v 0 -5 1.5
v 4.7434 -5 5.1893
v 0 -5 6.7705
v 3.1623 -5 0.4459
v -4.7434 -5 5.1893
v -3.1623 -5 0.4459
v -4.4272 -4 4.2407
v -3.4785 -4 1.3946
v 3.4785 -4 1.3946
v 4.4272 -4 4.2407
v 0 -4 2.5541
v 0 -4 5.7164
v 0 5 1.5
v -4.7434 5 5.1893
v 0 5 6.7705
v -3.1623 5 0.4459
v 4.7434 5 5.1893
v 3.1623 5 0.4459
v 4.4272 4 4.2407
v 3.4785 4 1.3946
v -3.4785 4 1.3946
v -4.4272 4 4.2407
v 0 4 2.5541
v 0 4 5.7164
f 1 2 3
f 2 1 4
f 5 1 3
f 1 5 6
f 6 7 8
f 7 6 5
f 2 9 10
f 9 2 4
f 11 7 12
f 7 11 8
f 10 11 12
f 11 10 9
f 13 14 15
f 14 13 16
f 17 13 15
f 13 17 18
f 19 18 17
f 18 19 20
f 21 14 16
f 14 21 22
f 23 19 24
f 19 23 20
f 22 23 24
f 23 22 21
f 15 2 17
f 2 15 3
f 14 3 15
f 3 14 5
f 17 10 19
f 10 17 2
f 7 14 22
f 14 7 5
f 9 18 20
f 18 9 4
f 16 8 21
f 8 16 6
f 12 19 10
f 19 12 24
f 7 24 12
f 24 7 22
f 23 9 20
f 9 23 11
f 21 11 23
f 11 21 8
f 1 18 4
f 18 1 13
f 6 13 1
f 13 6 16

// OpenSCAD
// file: s/u7038s01.scad
use <../../lib.scad>
function ldraw_lib__s__u7038s01() = [
// 0 ~Modulex Brick Angled 18  2 x  X Double - End
// 0 Name: s\u7038s01.dat
// 0 Author: Magnus Forsberg [MagFors]
// 0 !LDRAW_ORG Subpart UPDATE 2025-09
// 0 !LICENSE Licensed under CC BY 4.0 : see CAreadme.txt
// 
// 0 BFC CERTIFY CCW
  [0,"BFC","CERTIFY"],
  [0,"BFC","CCW"],
// 
// 0 !HISTORY 2025-09-29 [OrionP] Official Update 2025-09
// 
// 4 16 0 -16.9262 0 0 -3.75 0 7.905708 -1.114818 0 11.858545 -12.973363 0
  [4,16,0,-16.9262,0,0,-3.75,0,7.905708,-1.114818,0,11.858545,-12.973363,0],
// 4 16 -7.905708 -1.114818 0 0 -3.75 0 0 -16.9262 0 -11.858545 -12.973363 0
  [4,16,-7.905708,-1.114818,0,0,-3.75,0,0,-16.9262,0,-11.858545,-12.973363,0],
// 4 16 -11.067977 -10.601654 2.5 -8.696275 -3.486527 2.5 -7.905708 -1.114818 0 -11.858545 -12.973363 0
  [4,16,-11.067977,-10.601654,2.5,-8.696275,-3.486527,2.5,-7.905708,-1.114818,0,-11.858545,-12.973363,0],
// 4 16 7.905708 -1.114818 0 8.696275 -3.486527 2.5 11.067977 -10.601654 2.5 11.858545 -12.973363 0
  [4,16,7.905708,-1.114818,0,8.696275,-3.486527,2.5,11.067977,-10.601654,2.5,11.858545,-12.973363,0],
// 4 16 -11.067977 -10.601654 2.5 0 -14.290969 2.5 0 -6.385277 2.5 -8.696275 -3.486527 2.5
  [4,16,-11.067977,-10.601654,2.5,0,-14.290969,2.5,0,-6.385277,2.5,-8.696275,-3.486527,2.5],
// 4 16 0 -6.385277 2.5 0 -14.290969 2.5 11.067977 -10.601654 2.5 8.696275 -3.486527 2.5
  [4,16,0,-6.385277,2.5,0,-14.290969,2.5,11.067977,-10.601654,2.5,8.696275,-3.486527,2.5],
// 2 24 8.696275 -3.486527 2.5 11.067977 -10.601654 2.5
  [2,24,8.696275,-3.486527,2.5,11.067977,-10.601654,2.5],
// 2 24 -11.858545 -12.973363 0 -7.905708 -1.114818 0
  [2,24,-11.858545,-12.973363,0,-7.905708,-1.114818,0],
// 2 24 11.858545 -12.973363 0 7.905708 -1.114818 0
  [2,24,11.858545,-12.973363,0,7.905708,-1.114818,0],
// 2 24 7.905708 -1.114818 0 0 -3.75 0
  [2,24,7.905708,-1.114818,0,0,-3.75,0],
// 2 24 0 -6.385277 2.5 8.696275 -3.486527 2.5
  [2,24,0,-6.385277,2.5,8.696275,-3.486527,2.5],
// 2 24 0 -14.290969 2.5 -11.067977 -10.601654 2.5
  [2,24,0,-14.290969,2.5,-11.067977,-10.601654,2.5],
// 2 24 -8.696275 -3.486527 2.5 0 -6.385277 2.5
  [2,24,-8.696275,-3.486527,2.5,0,-6.385277,2.5],
// 2 24 -7.905708 -1.114818 0 0 -3.75 0
  [2,24,-7.905708,-1.114818,0,0,-3.75,0],
// 2 24 0 -14.290969 2.5 11.067977 -10.601654 2.5
  [2,24,0,-14.290969,2.5,11.067977,-10.601654,2.5],
// 2 24 0 -16.9262 0 -11.858545 -12.973363 0
  [2,24,0,-16.9262,0,-11.858545,-12.973363,0],
// 2 24 -8.696275 -3.486527 2.5 -11.067977 -10.601654 2.5
  [2,24,-8.696275,-3.486527,2.5,-11.067977,-10.601654,2.5],
// 2 24 0 -16.9262 0 11.858545 -12.973363 0
  [2,24,0,-16.9262,0,11.858545,-12.973363,0],
];
module ldraw_lib__s__u7038s01(step=0, col=false, unit=2/5, alt=false, line=0.2, solid=!$preview)
    makepoly(ldraw_lib__s__u7038s01(), step=step, col=col, unit=unit, alt=alt, line=line, solid=solid);
ldraw_lib__s__u7038s01(line=0.2);
// main file
use <../lib.scad>
use <s/u7038s01.scad>
function ldraw_lib__u7039() = [
// 0 Modulex Brick Angled 18  2 x  2 Double
// 0 Name: u7039.dat
// 0 Author: Magnus Forsberg [MagFors]
// 0 !LDRAW_ORG Part UPDATE 2025-09
// 0 !LICENSE Licensed under CC BY 4.0 : see CAreadme.txt
// 
// 0 !HELP 1 16 18.75 12.5 0 1 0 0 0 1 0 0 0 1 u7032.dat
// 0 !HELP 1 35 9.882 -7.044 0 0 .949 .316 0 .316 -.949 -1 0 0 u7001.dat
// 
// 0 BFC CERTIFY CCW
  [0,"BFC","CERTIFY"],
  [0,"BFC","CCW"],
// 
// 0 !KEYWORDS 18.4349 degree, Bricklink Mx2403B, Rebrickable 2403B, slope 1:3
// 
// 0 !HISTORY 2025-09-29 [OrionP] Official Update 2025-09
// 
// 1 16 0 0 -12.5 1 0 0 0 1 0 0 0 1 s\u7038s01.dat
  [1,16,0,0,-12.5,1,0,0,0,1,0,0,0,1, ldraw_lib__s__u7038s01()],
// 1 16 0 0 12.5 -1 0 0 0 1 0 0 0 -1 s\u7038s01.dat
  [1,16,0,0,12.5,-1,0,0,0,1,0,0,0,-1, ldraw_lib__s__u7038s01()],
// 
// 2 24 0 -16.9262 12.5 0 -16.9262 -12.5
  [2,24,0,-16.9262,12.5,0,-16.9262,-12.5],
// 2 24 -11.858545 -12.973363 -12.5 -11.858545 -12.973363 12.5
  [2,24,-11.858545,-12.973363,-12.5,-11.858545,-12.973363,12.5],
// 2 24 11.858545 -12.973363 -12.5 11.858545 -12.973363 12.5
  [2,24,11.858545,-12.973363,-12.5,11.858545,-12.973363,12.5],
// 2 24 0 -3.75 12.5 0 -3.75 -12.5
  [2,24,0,-3.75,12.5,0,-3.75,-12.5],
// 2 24 7.905708 -1.114818 -12.5 7.905708 -1.114818 12.5
  [2,24,7.905708,-1.114818,-12.5,7.905708,-1.114818,12.5],
// 2 24 -7.905708 -1.114818 -12.5 -7.905708 -1.114818 12.5
  [2,24,-7.905708,-1.114818,-12.5,-7.905708,-1.114818,12.5],
// 
// 2 24 0 -14.290969 10 0 -14.290969 -10
  [2,24,0,-14.290969,10,0,-14.290969,-10],
// 2 24 11.067977 -10.601654 10 11.067977 -10.601654 -10
  [2,24,11.067977,-10.601654,10,11.067977,-10.601654,-10],
// 2 24 -11.067977 -10.601654 10 -11.067977 -10.601654 -10
  [2,24,-11.067977,-10.601654,10,-11.067977,-10.601654,-10],
// 2 24 8.696275 -3.486527 10 8.696275 -3.486527 -10
  [2,24,8.696275,-3.486527,10,8.696275,-3.486527,-10],
// 2 24 -8.696275 -3.486527 10 -8.696275 -3.486527 -10
  [2,24,-8.696275,-3.486527,10,-8.696275,-3.486527,-10],
// 2 24 0 -6.385277 10 0 -6.385277 -10
  [2,24,0,-6.385277,10,0,-6.385277,-10],
// 
// 4 16 11.858545 -12.973363 12.5 0 -16.9262 12.5 0 -16.9262 -12.5 11.858545 -12.973363 -12.5
  [4,16,11.858545,-12.973363,12.5,0,-16.9262,12.5,0,-16.9262,-12.5,11.858545,-12.973363,-12.5],
// 4 16 -11.858545 -12.973363 12.5 -11.858545 -12.973363 -12.5 0 -16.9262 -12.5 0 -16.9262 12.5
  [4,16,-11.858545,-12.973363,12.5,-11.858545,-12.973363,-12.5,0,-16.9262,-12.5,0,-16.9262,12.5],
// 4 16 11.067977 -10.601654 10 11.858545 -12.973363 12.5 11.858545 -12.973363 -12.5 11.067977 -10.601654 -10
  [4,16,11.067977,-10.601654,10,11.858545,-12.973363,12.5,11.858545,-12.973363,-12.5,11.067977,-10.601654,-10],
// 4 16 -11.067977 -10.601654 10 -11.067977 -10.601654 -10 -11.858545 -12.973363 -12.5 -11.858545 -12.973363 12.5
  [4,16,-11.067977,-10.601654,10,-11.067977,-10.601654,-10,-11.858545,-12.973363,-12.5,-11.858545,-12.973363,12.5],
// 4 16 8.696275 -3.486527 10 8.696275 -3.486527 -10 7.905708 -1.114818 -12.5 7.905708 -1.114818 12.5
  [4,16,8.696275,-3.486527,10,8.696275,-3.486527,-10,7.905708,-1.114818,-12.5,7.905708,-1.114818,12.5],
// 4 16 -8.696275 -3.486527 10 -7.905708 -1.114818 12.5 -7.905708 -1.114818 -12.5 -8.696275 -3.486527 -10
  [4,16,-8.696275,-3.486527,10,-7.905708,-1.114818,12.5,-7.905708,-1.114818,-12.5,-8.696275,-3.486527,-10],
// 4 16 11.067977 -10.601654 10 11.067977 -10.601654 -10 0 -14.290969 -10 0 -14.290969 10
  [4,16,11.067977,-10.601654,10,11.067977,-10.601654,-10,0,-14.290969,-10,0,-14.290969,10],
// 4 16 -11.067977 -10.601654 10 0 -14.290969 10 0 -14.290969 -10 -11.067977 -10.601654 -10
  [4,16,-11.067977,-10.601654,10,0,-14.290969,10,0,-14.290969,-10,-11.067977,-10.601654,-10],
// 4 16 8.696275 -3.486527 10 0 -6.385277 10 0 -6.385277 -10 8.696275 -3.486527 -10
  [4,16,8.696275,-3.486527,10,0,-6.385277,10,0,-6.385277,-10,8.696275,-3.486527,-10],
// 4 16 -8.696275 -3.486527 10 -8.696275 -3.486527 -10 0 -6.385277 -10 0 -6.385277 10
  [4,16,-8.696275,-3.486527,10,-8.696275,-3.486527,-10,0,-6.385277,-10,0,-6.385277,10],
// 4 16 7.905708 -1.114818 12.5 7.905708 -1.114818 -12.5 0 -3.75 -12.5 0 -3.75 12.5
  [4,16,7.905708,-1.114818,12.5,7.905708,-1.114818,-12.5,0,-3.75,-12.5,0,-3.75,12.5],
// 4 16 -7.905708 -1.114818 12.5 0 -3.75 12.5 0 -3.75 -12.5 -7.905708 -1.114818 -12.5
  [4,16,-7.905708,-1.114818,12.5,0,-3.75,12.5,0,-3.75,-12.5,-7.905708,-1.114818,-12.5],
];
module ldraw_lib__u7039(step=0, col=false, unit=2/5, alt=false, line=0.2, solid=!$preview)
    makepoly(ldraw_lib__u7039(), step=step, col=col, unit=unit, alt=alt, line=line, solid=solid);
ldraw_lib__u7039(line=0.2);
